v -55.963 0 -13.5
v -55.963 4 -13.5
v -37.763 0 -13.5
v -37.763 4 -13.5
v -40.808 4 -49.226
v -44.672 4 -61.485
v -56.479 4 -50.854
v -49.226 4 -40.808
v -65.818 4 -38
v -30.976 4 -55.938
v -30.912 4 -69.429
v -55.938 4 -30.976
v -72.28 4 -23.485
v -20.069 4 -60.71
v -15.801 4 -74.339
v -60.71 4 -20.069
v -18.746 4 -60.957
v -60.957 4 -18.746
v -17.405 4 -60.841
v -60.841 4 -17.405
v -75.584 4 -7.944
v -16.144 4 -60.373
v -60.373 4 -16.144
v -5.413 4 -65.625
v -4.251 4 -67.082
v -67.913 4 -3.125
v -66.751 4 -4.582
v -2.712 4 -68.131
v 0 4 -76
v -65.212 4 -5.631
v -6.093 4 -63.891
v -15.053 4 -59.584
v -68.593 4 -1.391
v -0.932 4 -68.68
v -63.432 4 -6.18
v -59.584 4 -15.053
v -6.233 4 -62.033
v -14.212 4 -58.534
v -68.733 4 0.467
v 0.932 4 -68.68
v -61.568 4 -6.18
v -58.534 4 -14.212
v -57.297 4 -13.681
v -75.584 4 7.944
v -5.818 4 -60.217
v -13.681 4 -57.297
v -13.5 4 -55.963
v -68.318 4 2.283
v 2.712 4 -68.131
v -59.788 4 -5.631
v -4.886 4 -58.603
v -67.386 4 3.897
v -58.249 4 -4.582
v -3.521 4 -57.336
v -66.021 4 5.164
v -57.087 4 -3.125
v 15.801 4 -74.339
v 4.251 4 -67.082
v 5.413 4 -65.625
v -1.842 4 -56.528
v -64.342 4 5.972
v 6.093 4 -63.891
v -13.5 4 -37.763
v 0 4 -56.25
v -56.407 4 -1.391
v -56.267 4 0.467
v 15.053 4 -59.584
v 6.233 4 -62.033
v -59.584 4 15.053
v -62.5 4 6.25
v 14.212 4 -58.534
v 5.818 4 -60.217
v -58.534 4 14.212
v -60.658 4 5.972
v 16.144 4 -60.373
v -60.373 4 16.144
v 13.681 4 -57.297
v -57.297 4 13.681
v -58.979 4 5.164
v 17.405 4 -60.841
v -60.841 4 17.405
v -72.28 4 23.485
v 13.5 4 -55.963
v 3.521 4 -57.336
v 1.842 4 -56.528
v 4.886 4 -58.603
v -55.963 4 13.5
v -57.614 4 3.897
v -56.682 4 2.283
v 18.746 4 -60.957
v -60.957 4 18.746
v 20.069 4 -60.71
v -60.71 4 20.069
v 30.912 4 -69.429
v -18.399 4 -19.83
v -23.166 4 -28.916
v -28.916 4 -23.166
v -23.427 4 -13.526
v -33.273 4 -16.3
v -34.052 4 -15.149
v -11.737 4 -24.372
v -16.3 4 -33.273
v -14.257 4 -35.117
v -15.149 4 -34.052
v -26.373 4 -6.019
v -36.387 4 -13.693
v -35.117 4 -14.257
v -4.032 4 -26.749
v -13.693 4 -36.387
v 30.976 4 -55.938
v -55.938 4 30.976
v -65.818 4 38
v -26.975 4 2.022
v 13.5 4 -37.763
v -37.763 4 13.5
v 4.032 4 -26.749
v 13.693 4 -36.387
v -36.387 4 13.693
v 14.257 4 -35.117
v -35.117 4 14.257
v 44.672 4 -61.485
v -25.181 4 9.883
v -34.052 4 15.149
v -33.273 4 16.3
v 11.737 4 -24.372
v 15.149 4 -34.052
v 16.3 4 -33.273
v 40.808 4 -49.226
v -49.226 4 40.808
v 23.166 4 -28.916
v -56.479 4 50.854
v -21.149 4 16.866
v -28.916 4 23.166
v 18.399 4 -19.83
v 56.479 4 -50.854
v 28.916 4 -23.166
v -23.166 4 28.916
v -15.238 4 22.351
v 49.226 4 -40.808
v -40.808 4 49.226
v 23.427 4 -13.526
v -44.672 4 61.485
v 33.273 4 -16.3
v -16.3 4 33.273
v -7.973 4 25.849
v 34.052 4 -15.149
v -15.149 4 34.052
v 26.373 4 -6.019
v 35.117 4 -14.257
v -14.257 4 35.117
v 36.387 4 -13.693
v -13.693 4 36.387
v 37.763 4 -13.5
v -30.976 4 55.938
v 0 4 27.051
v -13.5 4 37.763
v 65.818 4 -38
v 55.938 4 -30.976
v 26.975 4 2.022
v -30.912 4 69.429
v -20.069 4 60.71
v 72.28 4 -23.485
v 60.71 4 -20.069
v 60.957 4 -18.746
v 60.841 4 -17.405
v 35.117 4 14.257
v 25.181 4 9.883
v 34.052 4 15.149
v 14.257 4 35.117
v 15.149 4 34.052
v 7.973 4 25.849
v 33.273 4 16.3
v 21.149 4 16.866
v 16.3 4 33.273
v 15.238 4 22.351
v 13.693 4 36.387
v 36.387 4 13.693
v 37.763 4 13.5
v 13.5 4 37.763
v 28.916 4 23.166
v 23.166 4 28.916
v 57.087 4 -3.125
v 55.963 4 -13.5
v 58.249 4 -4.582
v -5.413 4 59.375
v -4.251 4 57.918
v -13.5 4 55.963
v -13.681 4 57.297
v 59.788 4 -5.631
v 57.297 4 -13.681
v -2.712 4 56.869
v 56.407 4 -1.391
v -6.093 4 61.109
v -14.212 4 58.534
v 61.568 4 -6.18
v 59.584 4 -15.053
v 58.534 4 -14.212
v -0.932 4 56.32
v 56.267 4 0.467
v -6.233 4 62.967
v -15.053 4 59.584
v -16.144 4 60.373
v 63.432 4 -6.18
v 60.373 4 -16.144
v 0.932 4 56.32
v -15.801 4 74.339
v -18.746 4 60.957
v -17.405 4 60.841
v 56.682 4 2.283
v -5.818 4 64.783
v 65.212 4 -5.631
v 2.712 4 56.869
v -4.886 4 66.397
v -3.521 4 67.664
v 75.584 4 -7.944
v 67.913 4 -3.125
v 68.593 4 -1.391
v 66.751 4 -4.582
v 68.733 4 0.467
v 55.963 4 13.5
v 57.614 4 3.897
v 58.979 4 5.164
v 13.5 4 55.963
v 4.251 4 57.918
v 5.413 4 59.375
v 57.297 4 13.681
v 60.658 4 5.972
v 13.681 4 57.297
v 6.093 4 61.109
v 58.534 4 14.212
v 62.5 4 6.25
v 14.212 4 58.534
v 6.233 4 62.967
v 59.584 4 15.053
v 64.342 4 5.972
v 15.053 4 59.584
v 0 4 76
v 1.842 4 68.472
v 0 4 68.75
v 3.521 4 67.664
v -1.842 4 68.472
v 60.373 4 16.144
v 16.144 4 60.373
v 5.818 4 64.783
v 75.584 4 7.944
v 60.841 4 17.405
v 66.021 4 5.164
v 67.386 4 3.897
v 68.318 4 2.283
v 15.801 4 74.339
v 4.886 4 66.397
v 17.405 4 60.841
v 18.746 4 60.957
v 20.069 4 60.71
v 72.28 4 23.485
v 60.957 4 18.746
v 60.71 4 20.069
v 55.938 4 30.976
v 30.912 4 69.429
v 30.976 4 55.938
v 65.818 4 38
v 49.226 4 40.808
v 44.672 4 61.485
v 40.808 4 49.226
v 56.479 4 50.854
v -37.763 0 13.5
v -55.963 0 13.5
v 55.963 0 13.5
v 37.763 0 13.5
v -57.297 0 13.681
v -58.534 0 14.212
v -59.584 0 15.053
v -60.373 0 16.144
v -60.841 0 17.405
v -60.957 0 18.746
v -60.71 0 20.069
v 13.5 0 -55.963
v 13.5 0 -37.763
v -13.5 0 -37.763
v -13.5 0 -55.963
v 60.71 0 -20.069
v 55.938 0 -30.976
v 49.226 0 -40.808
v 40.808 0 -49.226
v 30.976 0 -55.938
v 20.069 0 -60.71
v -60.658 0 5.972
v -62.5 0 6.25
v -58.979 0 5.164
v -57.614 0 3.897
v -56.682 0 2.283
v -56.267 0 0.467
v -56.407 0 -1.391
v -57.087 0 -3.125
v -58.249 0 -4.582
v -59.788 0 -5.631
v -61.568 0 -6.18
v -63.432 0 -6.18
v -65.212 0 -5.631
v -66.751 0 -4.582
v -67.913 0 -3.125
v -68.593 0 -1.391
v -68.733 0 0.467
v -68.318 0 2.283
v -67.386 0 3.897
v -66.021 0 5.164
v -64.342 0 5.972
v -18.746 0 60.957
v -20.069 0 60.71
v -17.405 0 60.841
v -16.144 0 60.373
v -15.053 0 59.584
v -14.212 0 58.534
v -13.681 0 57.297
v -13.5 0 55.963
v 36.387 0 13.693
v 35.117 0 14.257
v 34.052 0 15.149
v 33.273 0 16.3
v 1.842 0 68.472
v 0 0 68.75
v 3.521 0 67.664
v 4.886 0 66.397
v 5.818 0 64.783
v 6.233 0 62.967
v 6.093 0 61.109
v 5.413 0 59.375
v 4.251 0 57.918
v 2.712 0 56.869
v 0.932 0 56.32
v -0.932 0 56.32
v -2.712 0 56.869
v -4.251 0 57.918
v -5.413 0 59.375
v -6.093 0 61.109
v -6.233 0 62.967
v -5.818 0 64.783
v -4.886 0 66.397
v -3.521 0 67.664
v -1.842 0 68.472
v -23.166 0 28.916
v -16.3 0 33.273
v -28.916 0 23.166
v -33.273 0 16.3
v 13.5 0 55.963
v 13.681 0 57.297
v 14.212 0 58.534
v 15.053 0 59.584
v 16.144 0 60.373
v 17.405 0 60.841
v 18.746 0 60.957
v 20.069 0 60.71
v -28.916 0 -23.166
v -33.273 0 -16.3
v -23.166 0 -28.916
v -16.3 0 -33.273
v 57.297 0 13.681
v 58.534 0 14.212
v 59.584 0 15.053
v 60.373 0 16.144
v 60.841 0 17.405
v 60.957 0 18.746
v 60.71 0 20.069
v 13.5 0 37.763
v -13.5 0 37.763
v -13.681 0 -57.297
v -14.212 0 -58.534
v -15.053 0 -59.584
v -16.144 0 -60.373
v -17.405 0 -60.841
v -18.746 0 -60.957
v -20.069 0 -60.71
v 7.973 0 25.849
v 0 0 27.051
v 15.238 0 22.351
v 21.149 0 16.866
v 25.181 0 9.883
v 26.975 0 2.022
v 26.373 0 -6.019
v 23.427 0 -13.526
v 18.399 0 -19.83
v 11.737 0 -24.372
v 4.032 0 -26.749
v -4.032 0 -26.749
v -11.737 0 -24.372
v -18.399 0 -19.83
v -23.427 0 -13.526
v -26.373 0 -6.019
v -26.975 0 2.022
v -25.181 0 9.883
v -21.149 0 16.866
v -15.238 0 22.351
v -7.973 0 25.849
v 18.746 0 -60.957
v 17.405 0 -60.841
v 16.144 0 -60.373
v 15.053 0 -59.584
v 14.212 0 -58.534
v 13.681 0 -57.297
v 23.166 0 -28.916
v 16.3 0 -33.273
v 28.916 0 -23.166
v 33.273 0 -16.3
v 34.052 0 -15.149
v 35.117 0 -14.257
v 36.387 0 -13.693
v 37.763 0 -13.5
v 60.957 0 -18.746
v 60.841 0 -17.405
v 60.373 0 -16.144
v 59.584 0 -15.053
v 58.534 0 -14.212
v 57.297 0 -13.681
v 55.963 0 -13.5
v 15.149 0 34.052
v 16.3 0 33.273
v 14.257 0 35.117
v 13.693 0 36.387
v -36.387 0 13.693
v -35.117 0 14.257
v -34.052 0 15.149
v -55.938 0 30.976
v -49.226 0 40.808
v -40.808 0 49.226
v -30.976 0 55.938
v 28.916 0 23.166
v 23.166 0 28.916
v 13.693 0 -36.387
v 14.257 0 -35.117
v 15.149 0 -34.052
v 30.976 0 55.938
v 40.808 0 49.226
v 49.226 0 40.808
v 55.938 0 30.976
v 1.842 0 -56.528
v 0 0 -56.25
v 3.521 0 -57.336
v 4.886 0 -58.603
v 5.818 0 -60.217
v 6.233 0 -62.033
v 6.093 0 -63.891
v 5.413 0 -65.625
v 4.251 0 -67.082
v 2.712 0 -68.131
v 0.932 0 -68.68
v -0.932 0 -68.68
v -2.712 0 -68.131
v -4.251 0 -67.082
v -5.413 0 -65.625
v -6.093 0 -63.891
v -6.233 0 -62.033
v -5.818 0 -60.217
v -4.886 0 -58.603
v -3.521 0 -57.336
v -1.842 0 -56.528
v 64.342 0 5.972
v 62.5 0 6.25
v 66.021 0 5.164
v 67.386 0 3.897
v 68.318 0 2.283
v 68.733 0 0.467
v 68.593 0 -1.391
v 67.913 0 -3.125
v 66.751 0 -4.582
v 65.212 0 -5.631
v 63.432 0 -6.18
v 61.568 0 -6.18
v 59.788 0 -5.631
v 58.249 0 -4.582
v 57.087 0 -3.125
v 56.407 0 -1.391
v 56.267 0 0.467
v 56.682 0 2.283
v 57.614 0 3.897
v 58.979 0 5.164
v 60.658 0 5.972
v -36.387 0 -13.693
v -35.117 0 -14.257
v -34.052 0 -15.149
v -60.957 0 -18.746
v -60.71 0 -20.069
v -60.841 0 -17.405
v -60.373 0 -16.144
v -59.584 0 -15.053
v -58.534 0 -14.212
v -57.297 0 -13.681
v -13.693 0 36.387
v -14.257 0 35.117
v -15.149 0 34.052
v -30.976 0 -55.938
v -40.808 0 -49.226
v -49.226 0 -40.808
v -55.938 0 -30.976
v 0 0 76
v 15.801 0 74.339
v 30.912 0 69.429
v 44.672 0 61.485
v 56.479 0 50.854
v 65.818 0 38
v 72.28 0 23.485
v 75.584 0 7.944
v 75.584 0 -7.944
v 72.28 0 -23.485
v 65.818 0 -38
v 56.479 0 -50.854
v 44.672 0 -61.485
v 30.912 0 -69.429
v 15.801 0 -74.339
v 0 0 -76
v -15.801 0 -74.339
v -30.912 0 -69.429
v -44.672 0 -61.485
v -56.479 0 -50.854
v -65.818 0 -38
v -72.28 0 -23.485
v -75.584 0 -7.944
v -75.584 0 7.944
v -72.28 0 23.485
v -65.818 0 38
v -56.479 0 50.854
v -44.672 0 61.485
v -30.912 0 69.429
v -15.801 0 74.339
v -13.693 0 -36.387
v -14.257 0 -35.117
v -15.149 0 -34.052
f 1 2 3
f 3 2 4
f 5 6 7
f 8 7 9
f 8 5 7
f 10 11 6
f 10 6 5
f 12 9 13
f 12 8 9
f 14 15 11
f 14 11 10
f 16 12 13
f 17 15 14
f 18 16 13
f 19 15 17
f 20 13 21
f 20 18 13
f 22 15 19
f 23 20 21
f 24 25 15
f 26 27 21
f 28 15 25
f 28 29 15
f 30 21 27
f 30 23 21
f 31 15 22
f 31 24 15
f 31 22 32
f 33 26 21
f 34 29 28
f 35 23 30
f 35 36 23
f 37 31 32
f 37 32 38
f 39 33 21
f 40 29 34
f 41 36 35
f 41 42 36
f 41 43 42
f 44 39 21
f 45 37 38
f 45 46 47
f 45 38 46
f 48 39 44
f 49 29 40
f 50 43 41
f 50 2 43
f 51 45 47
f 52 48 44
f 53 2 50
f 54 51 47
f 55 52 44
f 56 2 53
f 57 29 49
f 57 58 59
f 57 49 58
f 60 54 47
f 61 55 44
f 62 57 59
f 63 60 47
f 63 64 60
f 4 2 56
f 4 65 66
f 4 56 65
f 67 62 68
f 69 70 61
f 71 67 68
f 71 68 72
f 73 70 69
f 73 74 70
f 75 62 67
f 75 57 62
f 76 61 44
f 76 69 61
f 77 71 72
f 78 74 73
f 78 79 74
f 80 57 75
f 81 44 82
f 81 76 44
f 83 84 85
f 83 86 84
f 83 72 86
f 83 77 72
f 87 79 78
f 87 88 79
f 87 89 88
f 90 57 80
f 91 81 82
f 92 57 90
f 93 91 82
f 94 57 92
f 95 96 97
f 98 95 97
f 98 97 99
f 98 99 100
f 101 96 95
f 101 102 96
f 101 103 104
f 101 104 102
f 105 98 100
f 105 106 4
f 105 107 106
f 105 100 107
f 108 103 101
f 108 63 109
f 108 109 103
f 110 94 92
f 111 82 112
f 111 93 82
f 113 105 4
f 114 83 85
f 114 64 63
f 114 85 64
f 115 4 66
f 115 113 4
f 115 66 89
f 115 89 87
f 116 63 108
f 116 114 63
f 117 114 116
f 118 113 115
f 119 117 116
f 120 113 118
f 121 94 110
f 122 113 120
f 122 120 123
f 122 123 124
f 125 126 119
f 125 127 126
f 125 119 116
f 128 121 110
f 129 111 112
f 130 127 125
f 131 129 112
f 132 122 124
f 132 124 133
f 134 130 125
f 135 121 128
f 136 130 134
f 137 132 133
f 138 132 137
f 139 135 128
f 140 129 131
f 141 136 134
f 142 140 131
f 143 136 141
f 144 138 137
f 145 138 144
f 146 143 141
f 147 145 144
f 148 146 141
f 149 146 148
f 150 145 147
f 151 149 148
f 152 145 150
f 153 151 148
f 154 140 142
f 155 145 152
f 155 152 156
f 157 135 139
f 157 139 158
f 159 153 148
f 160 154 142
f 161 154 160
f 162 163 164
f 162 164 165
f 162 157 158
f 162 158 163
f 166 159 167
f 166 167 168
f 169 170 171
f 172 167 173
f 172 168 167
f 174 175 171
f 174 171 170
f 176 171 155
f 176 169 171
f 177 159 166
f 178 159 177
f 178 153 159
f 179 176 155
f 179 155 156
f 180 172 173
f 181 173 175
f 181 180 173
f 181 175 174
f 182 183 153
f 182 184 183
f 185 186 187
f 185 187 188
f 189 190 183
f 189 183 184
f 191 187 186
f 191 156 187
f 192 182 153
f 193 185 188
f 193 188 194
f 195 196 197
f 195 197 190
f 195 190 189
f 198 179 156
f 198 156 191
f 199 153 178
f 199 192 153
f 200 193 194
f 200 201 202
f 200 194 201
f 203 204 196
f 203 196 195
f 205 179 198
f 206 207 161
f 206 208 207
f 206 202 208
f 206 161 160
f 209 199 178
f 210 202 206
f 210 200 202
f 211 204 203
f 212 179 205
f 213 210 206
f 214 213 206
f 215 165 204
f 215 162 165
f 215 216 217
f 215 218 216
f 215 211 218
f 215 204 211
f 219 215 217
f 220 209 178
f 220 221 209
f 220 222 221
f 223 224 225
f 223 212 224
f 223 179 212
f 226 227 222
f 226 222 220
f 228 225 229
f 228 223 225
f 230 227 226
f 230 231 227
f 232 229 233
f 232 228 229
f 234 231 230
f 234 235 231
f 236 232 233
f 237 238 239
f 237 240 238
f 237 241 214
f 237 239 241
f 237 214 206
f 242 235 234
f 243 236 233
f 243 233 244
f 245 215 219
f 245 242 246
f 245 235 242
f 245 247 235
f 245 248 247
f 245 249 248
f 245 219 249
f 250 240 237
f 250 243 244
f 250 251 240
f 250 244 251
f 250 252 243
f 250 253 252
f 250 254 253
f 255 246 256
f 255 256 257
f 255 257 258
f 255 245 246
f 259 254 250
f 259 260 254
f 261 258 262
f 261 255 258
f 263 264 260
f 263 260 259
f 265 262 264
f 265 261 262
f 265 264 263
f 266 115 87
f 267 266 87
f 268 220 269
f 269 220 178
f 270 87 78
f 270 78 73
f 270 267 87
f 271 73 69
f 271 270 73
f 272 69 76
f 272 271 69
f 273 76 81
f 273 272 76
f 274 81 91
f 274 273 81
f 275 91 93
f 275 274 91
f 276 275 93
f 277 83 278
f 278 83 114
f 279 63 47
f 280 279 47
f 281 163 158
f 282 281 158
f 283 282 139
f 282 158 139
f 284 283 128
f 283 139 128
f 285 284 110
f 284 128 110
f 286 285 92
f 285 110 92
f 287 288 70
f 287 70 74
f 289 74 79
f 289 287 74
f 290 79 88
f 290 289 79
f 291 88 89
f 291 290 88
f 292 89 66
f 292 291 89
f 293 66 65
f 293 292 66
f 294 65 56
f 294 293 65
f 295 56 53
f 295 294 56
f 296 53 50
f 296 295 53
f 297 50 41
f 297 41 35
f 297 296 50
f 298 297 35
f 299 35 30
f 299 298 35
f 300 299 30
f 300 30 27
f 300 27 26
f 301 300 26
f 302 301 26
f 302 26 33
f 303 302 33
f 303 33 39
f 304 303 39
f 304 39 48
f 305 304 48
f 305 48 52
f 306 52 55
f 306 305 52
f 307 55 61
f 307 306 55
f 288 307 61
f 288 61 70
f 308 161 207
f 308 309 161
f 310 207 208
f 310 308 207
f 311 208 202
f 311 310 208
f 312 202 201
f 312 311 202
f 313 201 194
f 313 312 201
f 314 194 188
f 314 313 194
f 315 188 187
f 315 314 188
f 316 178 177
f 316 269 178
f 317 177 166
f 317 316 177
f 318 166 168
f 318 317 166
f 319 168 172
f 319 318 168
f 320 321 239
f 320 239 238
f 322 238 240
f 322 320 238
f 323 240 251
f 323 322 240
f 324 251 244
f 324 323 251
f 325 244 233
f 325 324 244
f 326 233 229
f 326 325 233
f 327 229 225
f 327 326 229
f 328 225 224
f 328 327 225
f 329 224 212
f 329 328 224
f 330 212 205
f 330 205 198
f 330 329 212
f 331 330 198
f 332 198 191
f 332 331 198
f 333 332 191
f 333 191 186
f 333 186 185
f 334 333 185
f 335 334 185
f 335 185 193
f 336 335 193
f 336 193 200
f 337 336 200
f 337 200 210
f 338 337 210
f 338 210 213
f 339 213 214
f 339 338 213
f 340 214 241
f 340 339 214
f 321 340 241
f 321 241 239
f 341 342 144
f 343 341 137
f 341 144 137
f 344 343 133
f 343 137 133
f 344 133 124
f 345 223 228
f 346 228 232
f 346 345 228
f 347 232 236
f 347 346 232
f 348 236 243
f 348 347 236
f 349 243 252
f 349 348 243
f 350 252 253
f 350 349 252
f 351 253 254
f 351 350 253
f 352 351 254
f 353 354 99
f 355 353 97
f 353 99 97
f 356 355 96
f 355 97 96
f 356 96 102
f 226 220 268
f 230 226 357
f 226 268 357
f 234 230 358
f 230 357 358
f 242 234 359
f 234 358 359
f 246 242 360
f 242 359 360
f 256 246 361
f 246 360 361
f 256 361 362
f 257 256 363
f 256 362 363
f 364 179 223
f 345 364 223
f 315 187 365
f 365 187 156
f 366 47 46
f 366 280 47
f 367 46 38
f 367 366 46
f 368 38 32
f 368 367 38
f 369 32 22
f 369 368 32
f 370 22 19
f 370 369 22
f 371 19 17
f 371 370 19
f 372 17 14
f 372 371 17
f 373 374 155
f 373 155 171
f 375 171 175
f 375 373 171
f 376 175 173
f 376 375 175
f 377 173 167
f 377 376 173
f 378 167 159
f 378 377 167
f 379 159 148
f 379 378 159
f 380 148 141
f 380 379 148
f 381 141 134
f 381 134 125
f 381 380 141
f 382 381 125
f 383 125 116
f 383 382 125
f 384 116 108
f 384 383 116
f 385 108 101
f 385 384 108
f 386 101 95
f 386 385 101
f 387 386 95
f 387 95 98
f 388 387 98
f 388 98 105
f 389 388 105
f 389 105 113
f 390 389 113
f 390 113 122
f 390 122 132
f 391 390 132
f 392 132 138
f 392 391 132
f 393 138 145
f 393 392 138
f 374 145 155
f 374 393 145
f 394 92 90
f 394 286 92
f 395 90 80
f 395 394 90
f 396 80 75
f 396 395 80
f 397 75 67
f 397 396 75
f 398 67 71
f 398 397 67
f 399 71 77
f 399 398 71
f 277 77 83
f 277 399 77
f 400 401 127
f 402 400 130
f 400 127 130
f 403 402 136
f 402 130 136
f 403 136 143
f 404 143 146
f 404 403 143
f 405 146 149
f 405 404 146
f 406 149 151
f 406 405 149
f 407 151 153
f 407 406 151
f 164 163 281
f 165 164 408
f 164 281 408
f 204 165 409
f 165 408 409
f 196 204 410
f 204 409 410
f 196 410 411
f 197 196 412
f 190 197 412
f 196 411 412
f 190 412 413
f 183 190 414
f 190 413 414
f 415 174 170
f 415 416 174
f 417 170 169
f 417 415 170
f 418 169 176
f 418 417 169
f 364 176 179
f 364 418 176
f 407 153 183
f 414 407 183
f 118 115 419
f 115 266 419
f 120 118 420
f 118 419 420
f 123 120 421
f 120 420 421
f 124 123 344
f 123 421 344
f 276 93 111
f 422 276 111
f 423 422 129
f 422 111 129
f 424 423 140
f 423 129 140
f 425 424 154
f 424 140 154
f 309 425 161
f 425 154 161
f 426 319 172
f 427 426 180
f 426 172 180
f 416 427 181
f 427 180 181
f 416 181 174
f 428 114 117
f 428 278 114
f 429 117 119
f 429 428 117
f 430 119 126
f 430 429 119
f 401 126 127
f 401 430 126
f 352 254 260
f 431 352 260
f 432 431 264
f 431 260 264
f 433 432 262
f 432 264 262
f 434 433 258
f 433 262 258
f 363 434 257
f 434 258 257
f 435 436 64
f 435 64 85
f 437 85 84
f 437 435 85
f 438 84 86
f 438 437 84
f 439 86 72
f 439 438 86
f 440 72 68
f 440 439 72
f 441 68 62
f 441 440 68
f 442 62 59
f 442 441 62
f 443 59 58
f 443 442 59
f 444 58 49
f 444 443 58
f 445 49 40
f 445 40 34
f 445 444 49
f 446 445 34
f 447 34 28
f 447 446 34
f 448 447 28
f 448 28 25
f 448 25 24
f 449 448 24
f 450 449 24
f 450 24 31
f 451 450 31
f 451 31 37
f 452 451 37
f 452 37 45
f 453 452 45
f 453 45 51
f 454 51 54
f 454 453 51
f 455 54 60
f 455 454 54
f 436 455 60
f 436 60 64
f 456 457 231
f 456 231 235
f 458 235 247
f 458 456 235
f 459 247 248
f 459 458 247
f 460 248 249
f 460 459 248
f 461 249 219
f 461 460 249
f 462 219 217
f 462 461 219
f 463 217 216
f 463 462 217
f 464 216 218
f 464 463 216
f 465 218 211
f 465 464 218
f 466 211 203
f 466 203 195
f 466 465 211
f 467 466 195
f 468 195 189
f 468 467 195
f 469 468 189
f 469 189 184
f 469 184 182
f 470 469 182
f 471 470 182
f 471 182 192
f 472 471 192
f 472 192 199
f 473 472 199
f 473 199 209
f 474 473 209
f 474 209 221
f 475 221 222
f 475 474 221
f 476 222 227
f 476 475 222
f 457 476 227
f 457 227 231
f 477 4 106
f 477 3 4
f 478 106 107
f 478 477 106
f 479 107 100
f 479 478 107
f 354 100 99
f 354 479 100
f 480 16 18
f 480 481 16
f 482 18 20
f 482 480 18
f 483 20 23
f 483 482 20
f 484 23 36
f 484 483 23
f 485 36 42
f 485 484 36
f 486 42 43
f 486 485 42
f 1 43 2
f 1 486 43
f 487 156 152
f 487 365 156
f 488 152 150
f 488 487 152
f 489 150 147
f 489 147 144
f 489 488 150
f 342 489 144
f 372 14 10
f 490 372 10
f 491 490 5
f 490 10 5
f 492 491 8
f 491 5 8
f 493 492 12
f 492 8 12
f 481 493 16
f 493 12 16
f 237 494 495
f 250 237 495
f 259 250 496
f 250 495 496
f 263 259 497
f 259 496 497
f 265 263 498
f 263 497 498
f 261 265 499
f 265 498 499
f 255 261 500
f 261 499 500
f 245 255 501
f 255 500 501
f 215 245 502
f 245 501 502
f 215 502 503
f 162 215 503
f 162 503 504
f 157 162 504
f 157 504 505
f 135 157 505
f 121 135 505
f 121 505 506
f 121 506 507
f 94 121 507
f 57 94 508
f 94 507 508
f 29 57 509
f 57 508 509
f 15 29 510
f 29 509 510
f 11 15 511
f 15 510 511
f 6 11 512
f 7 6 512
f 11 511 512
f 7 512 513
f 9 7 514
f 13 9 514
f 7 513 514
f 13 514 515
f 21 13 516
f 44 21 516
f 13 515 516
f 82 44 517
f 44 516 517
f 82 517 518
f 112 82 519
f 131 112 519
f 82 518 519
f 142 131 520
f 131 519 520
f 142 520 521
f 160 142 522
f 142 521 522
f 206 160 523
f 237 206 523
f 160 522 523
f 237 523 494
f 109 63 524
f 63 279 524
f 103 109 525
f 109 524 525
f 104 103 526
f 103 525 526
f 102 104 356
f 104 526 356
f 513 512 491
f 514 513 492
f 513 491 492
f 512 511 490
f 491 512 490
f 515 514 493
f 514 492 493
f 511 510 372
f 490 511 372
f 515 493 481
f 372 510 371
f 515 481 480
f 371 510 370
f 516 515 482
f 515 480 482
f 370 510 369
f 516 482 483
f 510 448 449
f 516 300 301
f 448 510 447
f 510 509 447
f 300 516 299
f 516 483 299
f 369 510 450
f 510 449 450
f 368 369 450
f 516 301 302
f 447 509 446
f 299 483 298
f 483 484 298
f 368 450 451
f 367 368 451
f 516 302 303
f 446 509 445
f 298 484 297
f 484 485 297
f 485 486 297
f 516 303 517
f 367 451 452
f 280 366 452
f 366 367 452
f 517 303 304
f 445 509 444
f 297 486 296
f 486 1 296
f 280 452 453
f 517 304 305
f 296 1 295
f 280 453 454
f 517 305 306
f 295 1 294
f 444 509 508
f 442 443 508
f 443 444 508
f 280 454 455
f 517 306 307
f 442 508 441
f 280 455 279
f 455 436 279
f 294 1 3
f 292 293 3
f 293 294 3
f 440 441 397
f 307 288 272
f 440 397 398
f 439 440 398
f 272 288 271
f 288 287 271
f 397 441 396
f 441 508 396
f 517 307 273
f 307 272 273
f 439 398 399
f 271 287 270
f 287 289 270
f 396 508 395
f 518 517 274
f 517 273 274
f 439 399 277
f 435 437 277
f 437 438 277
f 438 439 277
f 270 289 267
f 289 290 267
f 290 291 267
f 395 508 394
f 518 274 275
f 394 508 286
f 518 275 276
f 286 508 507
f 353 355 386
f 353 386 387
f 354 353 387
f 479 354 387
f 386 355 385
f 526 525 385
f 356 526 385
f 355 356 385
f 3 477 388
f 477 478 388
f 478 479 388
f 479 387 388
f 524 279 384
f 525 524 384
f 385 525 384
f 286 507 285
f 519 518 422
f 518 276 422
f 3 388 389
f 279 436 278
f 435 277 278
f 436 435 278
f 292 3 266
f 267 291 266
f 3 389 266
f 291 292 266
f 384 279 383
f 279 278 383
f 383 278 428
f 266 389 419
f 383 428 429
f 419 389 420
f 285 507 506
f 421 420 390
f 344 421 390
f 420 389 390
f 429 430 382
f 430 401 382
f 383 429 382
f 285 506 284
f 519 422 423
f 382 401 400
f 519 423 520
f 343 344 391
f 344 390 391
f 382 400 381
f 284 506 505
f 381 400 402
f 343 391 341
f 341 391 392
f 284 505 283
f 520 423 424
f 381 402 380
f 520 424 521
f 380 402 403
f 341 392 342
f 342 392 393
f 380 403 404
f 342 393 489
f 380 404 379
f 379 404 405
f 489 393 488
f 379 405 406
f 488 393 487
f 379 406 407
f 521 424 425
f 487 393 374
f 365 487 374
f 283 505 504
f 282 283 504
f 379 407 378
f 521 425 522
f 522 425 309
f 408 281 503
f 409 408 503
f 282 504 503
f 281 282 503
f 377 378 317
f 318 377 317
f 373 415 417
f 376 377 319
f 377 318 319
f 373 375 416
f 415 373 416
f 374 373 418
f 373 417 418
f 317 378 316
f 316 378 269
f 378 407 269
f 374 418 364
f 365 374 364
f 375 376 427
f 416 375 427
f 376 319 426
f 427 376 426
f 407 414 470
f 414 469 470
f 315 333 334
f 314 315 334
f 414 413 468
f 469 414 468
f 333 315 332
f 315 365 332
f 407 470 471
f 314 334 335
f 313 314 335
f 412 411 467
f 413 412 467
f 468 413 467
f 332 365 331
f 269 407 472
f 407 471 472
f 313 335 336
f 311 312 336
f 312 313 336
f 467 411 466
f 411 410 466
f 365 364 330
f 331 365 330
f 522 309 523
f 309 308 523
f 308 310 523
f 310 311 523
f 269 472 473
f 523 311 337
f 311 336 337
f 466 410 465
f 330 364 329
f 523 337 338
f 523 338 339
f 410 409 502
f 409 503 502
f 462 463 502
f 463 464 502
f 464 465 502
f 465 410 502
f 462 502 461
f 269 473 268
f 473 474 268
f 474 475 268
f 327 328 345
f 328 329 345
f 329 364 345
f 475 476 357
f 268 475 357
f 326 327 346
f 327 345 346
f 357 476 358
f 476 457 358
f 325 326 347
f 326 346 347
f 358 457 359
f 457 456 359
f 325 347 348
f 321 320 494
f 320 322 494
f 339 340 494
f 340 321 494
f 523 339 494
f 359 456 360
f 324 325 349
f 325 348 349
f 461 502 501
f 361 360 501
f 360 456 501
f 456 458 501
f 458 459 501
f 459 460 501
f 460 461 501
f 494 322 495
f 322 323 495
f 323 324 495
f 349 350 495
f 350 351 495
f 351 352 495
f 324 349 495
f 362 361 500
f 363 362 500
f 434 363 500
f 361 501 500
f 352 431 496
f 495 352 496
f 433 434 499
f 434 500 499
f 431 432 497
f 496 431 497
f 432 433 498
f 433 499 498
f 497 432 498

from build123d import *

# Parameters (mm, degrees)
SKETCH1_R           = 76
SKETCH1_R_2         = 27.051
SKETCH1_R_3         = 6.25
BOSS_EXTRUDE1_DEPTH = 4
CUT_EXTRUDE2_DEPTH  = 108.554637278
FILLET1_R           = 5


with BuildPart() as part:
    # Sketch1 → Boss-Extrude1 (new body)
    with BuildSketch(Plane(origin=(0, 0, 0), x_dir=(1, 0, 0), z_dir=(0, 1, 0))):
        with Locations(Location((0, 0, 0), (0, 0, 270))):
            Circle(SKETCH1_R)
        with Locations(Location((0, 0, 0), (0, 0, 270))):
            Circle(SKETCH1_R_2, mode=Mode.SUBTRACT)
        with Locations(Location((0, 62.5, 0), (0, 0, 270))):
            Circle(SKETCH1_R_3, mode=Mode.SUBTRACT)
        with Locations(Location((62.5, 0, 0), (0, 0, 270))):
            Circle(SKETCH1_R_3, mode=Mode.SUBTRACT)
        with Locations(Location((0, -62.5, 0), (0, 0, 270))):
            Circle(SKETCH1_R_3, mode=Mode.SUBTRACT)
        with Locations(Location((-62.5, 0, 0), (0, 0, 270))):
            Circle(SKETCH1_R_3, mode=Mode.SUBTRACT)
    extrude(amount=BOSS_EXTRUDE1_DEPTH)

    # Sketch4 → Cut-Extrude2 (cut, through all)
    with BuildSketch(Plane(origin=(0, 4, 0), x_dir=(1, 0, 0), z_dir=(0, 1, 0))):
        with BuildLine():
            ThreePointArc((-34.504008477, 13.5), (-26.19901335, 26.19901335), (-13.5, 34.504008477))
            Line((-13.5, 34.504008477), (-13.5, 62.5))
            ThreePointArc((-13.5, 62.5), (-45.213382975, 45.213382975), (-62.5, 13.5))
            Line((-62.5, 13.5), (-34.504008477, 13.5))
        make_face()
        with BuildLine():
            ThreePointArc((62.5, 13.5), (45.213382975, 45.213382975), (13.5, 62.5))
            Line((13.5, 62.5), (13.5, 34.504008477))
            ThreePointArc((13.5, 34.504008477), (26.19901335, 26.19901335), (34.504008477, 13.5))
            Line((34.504008477, 13.5), (62.5, 13.5))
        make_face()
        with BuildLine():
            Line((62.5, -13.5), (34.504008477, -13.5))
            ThreePointArc((34.504008477, -13.5), (26.19901335, -26.19901335), (13.5, -34.504008477))
            Line((13.5, -34.504008477), (13.5, -62.5))
            ThreePointArc((13.5, -62.5), (45.213382975, -45.213382975), (62.5, -13.5))
        make_face()
        with BuildLine():
            ThreePointArc((-13.5, -34.504008477), (-26.19901335, -26.19901335), (-34.504008477, -13.5))
            Line((-34.504008477, -13.5), (-62.5, -13.5))
            ThreePointArc((-62.5, -13.5), (-45.213382975, -45.213382975), (-13.5, -62.5))
            Line((-13.5, -62.5), (-13.5, -34.504008477))
        make_face()
    extrude(amount=-CUT_EXTRUDE2_DEPTH, mode=Mode.SUBTRACT)

    # Fillet1
    fillet1_edges = [part.edges().sort_by_distance(p)[0] for p in [
        (-34.504008477, 2, 13.5),
        (-13.5, 2, 34.504008477),
        (-13.5, 2, 62.5),
        (-62.5, 2, 13.5),
        (13.5, 2, 34.504008477),
        (34.504008477, 2, 13.5),
        (62.5, 2, 13.5),
        (13.5, 2, 62.5),
        (34.504008477, 2, -13.5),
        (13.5, 2, -34.504008477),
        (13.5, 2, -62.5),
        (62.5, 2, -13.5),
        (-13.5, 2, -34.504008477),
        (-34.504008477, 2, -13.5),
        (-62.5, 2, -13.5),
        (-13.5, 2, -62.5),
    ]]
    fillet(fillet1_edges, radius=FILLET1_R)


solid = part.part
